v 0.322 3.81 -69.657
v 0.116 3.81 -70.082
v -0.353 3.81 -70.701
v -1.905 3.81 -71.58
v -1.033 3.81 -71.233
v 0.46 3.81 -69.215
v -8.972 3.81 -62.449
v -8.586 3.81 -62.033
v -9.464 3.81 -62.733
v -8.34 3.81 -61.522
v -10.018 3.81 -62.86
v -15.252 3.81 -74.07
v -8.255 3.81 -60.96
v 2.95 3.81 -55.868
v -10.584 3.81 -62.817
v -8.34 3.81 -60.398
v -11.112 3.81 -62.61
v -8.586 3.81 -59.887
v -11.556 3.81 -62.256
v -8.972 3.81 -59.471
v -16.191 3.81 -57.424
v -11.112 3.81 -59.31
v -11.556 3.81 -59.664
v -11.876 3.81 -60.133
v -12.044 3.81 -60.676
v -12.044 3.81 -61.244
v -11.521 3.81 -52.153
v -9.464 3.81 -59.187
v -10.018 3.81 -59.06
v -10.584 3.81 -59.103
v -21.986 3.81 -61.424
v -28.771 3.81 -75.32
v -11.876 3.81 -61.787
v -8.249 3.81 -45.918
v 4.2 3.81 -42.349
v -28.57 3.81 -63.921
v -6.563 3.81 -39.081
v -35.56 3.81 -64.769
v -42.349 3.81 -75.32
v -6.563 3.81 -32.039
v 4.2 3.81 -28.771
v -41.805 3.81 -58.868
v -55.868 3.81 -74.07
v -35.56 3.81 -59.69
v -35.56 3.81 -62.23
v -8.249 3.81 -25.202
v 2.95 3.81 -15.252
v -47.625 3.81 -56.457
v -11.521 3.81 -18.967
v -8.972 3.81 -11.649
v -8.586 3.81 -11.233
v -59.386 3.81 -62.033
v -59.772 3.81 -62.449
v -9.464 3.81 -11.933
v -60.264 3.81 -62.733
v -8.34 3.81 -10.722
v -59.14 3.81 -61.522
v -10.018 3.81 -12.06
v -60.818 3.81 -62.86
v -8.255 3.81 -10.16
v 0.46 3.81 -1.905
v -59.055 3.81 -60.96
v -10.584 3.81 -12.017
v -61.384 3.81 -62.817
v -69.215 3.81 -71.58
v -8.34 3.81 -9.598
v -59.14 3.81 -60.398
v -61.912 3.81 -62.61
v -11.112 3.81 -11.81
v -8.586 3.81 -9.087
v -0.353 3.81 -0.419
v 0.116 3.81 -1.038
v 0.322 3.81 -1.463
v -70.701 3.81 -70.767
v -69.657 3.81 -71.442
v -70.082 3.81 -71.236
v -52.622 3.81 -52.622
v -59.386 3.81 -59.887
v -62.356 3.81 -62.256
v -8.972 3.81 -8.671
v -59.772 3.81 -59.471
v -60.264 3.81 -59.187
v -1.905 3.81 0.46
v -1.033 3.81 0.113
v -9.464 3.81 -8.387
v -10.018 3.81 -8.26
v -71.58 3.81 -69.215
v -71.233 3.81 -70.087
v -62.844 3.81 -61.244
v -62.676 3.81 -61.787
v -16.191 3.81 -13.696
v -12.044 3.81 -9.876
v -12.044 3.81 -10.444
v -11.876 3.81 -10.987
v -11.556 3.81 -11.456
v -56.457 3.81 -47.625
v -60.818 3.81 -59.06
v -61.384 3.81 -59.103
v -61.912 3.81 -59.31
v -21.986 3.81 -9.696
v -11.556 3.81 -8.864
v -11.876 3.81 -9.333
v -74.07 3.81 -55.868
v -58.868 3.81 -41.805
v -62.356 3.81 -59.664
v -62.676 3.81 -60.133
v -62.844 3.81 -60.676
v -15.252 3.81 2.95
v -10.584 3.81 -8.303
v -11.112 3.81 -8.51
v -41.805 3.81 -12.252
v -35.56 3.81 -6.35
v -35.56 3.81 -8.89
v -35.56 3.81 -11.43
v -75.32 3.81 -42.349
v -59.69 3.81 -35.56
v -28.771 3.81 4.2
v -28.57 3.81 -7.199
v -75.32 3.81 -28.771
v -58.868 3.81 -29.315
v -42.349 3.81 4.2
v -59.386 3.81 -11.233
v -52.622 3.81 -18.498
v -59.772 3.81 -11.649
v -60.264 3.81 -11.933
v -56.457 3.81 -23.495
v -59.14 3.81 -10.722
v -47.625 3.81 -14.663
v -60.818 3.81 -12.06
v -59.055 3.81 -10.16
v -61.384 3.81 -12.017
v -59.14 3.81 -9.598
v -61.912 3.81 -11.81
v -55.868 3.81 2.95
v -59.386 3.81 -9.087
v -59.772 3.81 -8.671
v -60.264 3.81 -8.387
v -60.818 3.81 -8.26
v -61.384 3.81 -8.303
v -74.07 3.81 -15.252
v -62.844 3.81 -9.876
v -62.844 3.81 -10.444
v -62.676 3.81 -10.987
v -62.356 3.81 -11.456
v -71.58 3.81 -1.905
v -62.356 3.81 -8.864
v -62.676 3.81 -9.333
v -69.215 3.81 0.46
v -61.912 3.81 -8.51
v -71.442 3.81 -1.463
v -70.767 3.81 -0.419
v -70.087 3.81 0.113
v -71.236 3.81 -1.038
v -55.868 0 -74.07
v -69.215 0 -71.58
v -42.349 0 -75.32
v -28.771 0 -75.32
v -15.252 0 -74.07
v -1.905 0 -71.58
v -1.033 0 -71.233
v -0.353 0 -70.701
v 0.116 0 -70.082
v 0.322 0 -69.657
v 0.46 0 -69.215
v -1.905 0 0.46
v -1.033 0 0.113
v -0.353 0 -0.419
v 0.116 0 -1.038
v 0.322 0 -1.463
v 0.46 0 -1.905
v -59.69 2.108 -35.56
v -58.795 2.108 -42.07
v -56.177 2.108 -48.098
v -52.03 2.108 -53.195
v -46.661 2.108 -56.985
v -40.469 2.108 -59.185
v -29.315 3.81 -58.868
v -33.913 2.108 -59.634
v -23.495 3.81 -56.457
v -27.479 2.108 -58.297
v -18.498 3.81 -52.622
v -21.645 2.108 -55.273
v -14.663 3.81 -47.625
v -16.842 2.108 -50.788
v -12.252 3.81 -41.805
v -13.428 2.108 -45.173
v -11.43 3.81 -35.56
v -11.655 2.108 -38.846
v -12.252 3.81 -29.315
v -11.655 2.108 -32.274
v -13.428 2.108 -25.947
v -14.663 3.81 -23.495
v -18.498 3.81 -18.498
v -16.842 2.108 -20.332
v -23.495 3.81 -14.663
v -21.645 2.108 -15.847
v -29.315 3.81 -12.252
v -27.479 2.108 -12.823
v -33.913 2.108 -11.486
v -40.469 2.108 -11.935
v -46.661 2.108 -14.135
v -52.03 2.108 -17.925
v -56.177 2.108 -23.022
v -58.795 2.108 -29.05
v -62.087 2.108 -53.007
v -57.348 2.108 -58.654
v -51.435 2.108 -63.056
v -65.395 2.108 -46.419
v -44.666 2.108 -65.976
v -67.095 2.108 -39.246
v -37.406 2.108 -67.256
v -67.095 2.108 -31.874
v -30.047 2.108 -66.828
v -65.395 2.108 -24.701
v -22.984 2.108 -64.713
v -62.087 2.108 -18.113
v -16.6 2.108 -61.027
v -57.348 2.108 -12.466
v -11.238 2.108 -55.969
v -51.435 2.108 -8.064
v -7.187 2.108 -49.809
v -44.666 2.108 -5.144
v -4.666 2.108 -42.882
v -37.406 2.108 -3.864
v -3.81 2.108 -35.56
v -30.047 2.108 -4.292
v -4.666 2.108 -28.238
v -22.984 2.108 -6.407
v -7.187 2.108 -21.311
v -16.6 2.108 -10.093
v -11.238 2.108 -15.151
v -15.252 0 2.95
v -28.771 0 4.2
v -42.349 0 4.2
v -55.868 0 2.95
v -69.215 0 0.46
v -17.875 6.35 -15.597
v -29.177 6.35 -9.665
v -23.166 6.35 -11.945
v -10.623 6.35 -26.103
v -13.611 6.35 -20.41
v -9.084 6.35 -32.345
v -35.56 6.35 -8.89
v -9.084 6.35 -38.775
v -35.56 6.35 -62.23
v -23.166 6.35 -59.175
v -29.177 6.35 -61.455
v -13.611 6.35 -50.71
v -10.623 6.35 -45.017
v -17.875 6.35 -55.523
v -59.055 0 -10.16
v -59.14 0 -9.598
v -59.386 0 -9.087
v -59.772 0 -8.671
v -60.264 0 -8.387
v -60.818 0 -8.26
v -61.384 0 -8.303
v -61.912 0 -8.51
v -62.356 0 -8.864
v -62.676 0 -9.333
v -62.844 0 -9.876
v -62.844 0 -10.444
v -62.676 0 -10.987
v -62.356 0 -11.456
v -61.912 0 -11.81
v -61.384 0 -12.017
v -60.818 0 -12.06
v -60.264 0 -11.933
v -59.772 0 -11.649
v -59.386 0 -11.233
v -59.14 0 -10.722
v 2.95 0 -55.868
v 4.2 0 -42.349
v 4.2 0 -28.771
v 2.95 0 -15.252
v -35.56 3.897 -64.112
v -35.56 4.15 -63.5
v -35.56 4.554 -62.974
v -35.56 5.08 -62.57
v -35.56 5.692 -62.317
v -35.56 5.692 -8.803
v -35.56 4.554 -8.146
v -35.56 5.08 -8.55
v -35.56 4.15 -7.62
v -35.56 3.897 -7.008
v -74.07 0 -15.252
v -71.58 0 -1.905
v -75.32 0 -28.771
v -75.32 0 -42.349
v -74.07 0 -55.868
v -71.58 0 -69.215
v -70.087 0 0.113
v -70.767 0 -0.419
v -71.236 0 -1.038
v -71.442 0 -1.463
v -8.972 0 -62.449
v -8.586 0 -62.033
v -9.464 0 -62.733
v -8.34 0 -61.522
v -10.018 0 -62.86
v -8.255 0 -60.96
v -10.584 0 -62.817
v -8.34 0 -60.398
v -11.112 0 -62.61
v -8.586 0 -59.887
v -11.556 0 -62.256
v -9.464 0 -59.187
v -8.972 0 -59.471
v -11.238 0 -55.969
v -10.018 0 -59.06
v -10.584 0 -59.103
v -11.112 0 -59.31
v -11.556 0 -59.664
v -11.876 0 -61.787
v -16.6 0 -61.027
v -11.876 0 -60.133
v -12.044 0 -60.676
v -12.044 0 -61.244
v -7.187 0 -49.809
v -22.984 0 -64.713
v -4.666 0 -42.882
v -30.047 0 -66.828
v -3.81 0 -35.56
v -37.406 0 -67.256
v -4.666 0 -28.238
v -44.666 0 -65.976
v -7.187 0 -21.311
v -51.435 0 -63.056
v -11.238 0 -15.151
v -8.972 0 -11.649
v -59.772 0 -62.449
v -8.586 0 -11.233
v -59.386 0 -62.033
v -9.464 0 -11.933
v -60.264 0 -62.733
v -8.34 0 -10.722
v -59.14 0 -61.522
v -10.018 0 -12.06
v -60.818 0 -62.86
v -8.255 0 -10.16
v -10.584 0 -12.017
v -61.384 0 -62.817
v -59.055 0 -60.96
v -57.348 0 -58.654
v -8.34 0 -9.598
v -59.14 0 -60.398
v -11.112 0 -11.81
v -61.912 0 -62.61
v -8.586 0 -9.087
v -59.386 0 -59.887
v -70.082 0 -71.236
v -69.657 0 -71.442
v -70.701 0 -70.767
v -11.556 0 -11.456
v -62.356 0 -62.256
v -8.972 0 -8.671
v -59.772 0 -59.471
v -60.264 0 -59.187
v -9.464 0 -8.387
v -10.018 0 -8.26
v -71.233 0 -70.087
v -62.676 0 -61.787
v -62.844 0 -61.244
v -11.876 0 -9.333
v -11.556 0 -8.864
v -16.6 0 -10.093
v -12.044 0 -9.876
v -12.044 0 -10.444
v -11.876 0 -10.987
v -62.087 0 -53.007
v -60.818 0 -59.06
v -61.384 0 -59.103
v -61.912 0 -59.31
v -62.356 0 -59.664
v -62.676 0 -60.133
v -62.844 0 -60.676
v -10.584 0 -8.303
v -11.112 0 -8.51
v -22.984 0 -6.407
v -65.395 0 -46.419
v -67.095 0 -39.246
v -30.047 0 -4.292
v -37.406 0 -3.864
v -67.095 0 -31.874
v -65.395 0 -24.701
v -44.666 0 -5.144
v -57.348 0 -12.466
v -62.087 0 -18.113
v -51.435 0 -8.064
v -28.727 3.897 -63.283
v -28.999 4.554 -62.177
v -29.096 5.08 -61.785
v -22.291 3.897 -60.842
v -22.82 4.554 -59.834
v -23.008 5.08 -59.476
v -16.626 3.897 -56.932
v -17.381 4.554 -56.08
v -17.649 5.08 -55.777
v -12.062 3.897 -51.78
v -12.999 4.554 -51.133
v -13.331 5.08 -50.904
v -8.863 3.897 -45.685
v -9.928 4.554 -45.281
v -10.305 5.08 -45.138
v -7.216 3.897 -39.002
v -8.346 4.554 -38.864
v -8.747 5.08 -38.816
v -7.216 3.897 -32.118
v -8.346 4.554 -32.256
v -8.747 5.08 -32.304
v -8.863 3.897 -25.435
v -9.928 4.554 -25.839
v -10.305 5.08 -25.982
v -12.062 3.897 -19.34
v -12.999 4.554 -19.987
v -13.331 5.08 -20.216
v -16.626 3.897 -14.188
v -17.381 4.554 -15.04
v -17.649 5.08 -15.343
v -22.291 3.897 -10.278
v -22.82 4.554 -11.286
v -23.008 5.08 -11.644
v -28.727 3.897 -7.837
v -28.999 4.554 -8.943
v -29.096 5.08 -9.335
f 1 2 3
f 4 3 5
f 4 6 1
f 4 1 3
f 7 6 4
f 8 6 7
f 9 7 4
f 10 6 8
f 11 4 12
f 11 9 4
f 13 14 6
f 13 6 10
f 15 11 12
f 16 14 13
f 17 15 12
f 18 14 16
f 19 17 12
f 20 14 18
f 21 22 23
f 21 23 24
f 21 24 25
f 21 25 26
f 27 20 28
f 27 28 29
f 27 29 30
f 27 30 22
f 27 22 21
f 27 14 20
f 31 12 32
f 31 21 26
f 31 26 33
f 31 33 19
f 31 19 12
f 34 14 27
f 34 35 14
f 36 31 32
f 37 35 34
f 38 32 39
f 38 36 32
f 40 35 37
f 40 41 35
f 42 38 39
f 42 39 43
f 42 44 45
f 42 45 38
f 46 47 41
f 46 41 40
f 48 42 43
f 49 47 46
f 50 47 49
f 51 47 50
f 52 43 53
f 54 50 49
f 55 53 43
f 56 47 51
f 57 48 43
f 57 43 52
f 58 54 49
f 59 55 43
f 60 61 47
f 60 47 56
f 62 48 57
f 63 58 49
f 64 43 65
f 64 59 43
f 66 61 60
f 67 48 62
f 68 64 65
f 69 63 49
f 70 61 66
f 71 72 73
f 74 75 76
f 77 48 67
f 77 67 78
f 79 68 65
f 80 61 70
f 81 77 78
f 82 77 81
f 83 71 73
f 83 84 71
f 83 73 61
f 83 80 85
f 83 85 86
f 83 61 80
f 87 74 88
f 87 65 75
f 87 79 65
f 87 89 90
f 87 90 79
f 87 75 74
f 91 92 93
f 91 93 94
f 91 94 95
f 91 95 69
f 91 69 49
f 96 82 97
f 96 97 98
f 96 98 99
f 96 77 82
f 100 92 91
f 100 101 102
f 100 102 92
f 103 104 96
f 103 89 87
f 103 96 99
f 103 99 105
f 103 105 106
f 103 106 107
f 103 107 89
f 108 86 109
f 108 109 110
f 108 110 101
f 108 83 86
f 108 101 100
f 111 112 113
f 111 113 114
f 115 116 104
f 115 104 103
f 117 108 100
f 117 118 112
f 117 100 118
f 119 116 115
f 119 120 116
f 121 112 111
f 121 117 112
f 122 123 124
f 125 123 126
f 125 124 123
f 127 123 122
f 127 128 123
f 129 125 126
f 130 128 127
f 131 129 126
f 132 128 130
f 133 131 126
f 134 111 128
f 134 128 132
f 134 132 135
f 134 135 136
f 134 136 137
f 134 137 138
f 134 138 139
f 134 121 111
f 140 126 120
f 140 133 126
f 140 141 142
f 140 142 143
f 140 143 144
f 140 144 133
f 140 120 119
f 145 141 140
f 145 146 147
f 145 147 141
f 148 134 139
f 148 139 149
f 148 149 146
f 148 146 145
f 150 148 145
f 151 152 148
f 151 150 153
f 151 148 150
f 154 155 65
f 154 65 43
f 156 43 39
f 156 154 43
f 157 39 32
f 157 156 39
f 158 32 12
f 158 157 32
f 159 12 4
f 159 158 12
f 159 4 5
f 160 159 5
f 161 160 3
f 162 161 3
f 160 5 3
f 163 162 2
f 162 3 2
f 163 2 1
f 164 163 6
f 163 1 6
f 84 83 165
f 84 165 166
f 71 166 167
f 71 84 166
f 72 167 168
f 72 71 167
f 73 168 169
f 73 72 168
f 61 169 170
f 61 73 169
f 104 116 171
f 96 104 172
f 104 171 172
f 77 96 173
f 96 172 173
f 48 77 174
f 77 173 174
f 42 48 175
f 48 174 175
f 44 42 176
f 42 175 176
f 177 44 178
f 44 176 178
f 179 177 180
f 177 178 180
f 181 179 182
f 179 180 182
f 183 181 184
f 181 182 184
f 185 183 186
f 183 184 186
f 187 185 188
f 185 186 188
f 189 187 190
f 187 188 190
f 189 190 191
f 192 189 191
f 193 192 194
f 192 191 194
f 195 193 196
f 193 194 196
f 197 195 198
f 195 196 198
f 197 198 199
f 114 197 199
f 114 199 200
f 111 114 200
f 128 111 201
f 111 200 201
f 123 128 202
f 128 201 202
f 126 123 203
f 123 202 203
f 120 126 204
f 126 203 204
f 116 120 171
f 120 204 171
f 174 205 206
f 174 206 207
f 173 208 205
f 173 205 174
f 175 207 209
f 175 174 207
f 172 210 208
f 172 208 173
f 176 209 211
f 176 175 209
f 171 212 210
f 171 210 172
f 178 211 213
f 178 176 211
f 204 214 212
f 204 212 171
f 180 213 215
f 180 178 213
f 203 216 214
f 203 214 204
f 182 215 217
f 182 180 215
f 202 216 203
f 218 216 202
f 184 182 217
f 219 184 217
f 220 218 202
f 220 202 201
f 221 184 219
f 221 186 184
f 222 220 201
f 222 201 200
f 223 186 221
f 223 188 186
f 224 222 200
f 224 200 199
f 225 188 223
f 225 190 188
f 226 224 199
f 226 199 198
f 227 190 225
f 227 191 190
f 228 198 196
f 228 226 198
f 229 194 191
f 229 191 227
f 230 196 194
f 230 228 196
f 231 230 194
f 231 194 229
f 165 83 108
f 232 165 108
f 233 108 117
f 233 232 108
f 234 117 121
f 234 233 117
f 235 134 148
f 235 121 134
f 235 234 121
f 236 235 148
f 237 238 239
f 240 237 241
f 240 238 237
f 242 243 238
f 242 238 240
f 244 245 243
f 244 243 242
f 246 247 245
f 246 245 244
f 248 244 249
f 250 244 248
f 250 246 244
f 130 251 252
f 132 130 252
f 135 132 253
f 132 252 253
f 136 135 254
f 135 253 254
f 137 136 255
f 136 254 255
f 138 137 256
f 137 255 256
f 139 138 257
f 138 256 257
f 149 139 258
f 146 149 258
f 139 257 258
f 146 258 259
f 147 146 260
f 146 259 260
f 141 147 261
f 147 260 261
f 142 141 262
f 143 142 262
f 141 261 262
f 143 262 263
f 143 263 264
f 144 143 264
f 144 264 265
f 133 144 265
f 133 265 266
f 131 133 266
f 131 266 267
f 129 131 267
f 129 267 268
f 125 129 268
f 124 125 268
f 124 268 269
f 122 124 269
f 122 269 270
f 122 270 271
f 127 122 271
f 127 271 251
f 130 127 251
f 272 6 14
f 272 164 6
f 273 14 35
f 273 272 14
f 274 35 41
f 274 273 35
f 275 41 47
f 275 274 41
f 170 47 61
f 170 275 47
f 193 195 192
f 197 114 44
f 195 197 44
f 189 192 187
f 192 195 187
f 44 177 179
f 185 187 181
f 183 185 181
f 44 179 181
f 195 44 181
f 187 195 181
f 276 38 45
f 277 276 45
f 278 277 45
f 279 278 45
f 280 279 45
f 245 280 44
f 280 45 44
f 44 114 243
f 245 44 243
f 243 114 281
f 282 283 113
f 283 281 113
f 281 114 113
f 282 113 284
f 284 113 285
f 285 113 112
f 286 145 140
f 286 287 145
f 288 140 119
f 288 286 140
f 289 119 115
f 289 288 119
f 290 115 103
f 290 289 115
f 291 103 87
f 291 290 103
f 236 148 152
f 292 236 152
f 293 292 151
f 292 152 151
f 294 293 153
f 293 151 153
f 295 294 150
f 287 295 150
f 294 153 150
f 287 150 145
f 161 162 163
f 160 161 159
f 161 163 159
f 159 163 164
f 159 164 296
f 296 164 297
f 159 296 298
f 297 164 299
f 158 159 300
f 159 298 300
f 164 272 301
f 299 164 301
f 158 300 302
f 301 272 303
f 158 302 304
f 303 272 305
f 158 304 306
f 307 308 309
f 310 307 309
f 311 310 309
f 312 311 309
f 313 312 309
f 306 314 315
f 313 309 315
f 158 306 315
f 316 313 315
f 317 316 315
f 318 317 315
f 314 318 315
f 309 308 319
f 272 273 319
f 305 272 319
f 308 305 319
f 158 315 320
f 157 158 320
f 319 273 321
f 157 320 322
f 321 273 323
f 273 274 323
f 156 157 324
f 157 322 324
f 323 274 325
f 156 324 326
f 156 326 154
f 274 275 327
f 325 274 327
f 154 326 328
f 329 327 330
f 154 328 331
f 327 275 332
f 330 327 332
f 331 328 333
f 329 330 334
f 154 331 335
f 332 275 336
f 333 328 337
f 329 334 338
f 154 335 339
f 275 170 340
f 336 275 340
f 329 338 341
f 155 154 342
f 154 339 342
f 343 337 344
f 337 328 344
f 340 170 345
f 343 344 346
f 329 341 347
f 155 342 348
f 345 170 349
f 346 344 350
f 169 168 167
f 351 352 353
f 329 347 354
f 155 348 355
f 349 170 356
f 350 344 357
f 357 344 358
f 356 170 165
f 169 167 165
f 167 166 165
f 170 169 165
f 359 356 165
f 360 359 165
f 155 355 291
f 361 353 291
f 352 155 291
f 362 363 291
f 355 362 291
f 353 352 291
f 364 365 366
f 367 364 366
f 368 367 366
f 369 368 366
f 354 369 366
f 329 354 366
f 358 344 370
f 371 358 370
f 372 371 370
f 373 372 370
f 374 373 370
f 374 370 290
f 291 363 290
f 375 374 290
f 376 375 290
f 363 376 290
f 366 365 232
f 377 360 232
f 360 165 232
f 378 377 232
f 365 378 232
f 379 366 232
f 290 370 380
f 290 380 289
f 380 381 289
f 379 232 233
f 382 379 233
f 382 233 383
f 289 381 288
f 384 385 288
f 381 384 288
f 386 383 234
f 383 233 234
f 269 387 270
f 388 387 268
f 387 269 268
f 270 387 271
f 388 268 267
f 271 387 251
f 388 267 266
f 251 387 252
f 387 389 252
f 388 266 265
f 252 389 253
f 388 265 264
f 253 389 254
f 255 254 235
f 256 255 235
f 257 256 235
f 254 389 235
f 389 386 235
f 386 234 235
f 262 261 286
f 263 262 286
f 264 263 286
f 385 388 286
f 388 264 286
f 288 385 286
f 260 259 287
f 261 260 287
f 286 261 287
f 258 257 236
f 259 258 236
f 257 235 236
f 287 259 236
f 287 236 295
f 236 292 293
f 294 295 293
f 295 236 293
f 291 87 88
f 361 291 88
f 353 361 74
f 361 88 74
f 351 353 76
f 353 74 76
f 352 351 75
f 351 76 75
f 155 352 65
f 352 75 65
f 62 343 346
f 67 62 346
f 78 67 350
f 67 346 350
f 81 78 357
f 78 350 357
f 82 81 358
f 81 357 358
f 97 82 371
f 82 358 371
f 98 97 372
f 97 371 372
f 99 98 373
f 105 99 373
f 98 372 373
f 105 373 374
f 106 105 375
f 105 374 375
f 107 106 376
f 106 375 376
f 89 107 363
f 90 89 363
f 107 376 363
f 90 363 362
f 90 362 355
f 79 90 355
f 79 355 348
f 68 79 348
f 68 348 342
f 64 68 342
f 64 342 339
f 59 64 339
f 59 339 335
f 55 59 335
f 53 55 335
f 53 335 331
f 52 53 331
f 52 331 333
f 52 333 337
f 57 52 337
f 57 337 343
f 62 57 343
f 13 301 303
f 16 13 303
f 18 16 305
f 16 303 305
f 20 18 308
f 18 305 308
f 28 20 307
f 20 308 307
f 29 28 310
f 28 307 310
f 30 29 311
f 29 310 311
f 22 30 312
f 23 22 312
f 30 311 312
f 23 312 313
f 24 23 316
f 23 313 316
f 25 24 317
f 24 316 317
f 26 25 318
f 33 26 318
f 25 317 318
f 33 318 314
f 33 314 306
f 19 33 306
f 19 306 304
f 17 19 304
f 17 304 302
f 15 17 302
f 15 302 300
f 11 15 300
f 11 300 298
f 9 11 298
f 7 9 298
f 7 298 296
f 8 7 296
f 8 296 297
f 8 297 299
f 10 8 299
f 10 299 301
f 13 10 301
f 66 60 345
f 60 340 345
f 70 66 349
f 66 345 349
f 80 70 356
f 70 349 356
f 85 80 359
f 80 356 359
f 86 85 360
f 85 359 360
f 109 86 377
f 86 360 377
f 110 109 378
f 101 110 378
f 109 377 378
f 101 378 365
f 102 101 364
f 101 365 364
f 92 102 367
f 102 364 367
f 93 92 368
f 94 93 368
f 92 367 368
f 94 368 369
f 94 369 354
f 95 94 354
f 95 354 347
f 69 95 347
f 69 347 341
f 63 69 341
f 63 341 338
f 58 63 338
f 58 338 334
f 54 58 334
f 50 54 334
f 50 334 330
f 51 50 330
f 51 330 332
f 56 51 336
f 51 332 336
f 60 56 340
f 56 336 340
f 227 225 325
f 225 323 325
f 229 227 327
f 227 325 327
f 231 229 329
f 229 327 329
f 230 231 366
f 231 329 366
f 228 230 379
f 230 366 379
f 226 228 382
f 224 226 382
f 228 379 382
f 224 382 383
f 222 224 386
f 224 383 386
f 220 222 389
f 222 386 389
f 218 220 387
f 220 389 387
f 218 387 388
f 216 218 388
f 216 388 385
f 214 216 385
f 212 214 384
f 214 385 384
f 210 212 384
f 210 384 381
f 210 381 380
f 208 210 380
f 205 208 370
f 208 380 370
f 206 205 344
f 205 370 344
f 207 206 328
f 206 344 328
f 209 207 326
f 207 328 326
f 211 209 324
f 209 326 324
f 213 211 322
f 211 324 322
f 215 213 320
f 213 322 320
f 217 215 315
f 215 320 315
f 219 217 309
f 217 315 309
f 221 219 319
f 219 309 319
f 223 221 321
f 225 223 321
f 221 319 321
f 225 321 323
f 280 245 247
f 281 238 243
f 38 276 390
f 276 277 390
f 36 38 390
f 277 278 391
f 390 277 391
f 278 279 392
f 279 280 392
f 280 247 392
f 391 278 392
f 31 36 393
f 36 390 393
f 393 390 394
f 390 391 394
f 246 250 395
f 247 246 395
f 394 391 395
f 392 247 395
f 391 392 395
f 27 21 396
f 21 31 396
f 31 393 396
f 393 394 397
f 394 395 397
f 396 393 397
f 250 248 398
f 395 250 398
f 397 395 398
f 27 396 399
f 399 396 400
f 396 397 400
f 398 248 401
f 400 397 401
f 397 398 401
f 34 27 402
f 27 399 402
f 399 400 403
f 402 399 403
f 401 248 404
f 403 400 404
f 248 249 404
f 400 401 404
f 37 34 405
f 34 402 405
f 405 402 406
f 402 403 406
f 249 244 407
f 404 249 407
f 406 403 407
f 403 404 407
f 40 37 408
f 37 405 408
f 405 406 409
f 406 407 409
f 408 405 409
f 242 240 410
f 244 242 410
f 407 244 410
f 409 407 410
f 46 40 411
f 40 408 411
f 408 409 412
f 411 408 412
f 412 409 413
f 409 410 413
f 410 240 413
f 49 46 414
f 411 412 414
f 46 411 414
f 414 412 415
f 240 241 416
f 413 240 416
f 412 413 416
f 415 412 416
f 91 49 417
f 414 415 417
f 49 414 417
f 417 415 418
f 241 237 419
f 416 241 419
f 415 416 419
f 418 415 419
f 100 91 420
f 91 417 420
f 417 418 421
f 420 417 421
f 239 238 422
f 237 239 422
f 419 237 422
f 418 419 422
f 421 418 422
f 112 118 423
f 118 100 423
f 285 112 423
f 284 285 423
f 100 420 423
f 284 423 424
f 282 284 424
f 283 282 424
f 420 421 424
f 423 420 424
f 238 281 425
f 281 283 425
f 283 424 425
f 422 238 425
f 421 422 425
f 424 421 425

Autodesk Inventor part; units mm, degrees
ref_plane "YZ Plane" through (0, 0, 0) normal (1, 0, 0) x (0, 1, 0)
ref_plane "XZ Plane" through (0, 0, 0) normal (0, 1, 0) x (-1, 0, 0)
ref_plane "XY Plane" through (0, 0, 0) normal (0, 0, 1) x (1, 0, 0)
sketch "Sketch1" plane through (0, 0, 0) normal (0, 1, 0) x (-1, 0, 0)
  line L0 (0, 0) -> (0, -71.12)
  line L1 (0, -71.12) -> (71.12, -71.12)
  line L2 (71.12, -71.12) -> (71.12, 0)
  line L3 (71.12, 0) -> (0, 0)
  arc A0 (71.12, -71.12) -> (71.12, 0) centre (-71.8439, -35.56) ccw
  arc A1 (0, 0) -> (0, -71.12) centre (142.9639, -35.56) ccw
  arc A2 (0, -71.12) -> (71.12, -71.12) centre (35.56, 71.8439) ccw
  arc A3 (71.12, 0) -> (0, 0) centre (35.56, -142.9639) ccw
  circle A4 centre (35.56, -35.56) radius 24.13
  dimension "d9" = 71.12
  dimension "d10" = 71.12
  dimension "d14" = 147.32
  dimension "d17" = 48.26
  dimension "d18" = 35.56
  dimension "d19" = 35.56
extrude "Extrusion1" add sketch "Sketch1" along normal blind 3.81
fillet "Fillet1" radius 3.175 4 edges at (0, 1.905, 0) (0, 1.905, -71.12) (-71.12, 1.905, 0) (-71.12, 1.905, -71.12)
sketch "Sketch2" plane through (0, 3.81, 0) normal (0, 1, 0) x (1, 0, 0)
  point P0 (0, 0)
sketch "Sketch3" plane through (0, 0, 0) normal (0, -1, 0) x (1, 0, 0)
  circle A0 centre (-35.56, -35.56) radius 24.13 projected
  circle A1 centre (-35.56, -35.56) radius 31.75
  circle A2 centre (-35.56, -35.56) radius 24.13
  point P0 (0, 0)
  dimension "d23" = 63.5
extrude "Extrusion2" cut sketch "Sketch3" against normal blind 2.1079
sketch "Sketch4" plane through (0, 0, 0) normal (0, -1, 0) x (1, 0, 0)
  circle A0 centre (-35.56, -35.56) radius 24.13 projected
  circle A1 centre (-35.56, -35.56) radius 31.75 projected
  circle A2 centre (-60.96, -10.16) radius 1.905
  arc A3 (-1.9053, 0.4605) -> (-69.2147, 0.4605) centre (-35.56, -142.9639) ccw construction
  line L0 (-35.56, 4.3561) -> (-35.56, -75.4761) construction
  arc A4 (-69.2147, -71.5805) -> (-1.9053, -71.5805) centre (-35.56, 71.8439) ccw construction
  arc A5 (-71.5805, -1.9053) -> (-71.5805, -69.2147) centre (71.8439, -35.56) ccw construction
  line L1 (-75.4761, -35.56) -> (4.3561, -35.56) construction
  arc A6 (0.4605, -69.2147) -> (0.4605, -1.9053) centre (-142.9639, -35.56) ccw construction
  line L2 (-75.4761, -35.56) -> (-75.4761, 1.4435) construction
  circle A7 centre (-10.16, -10.16) radius 1.905
  line L3 (4.3561, -35.56) -> (4.3561, 1.4435) construction
  circle A8 centre (-60.96, -60.96) radius 1.905
  circle A9 centre (-10.16, -60.96) radius 1.905
  point P0 (0, 0)
  dimension "d26" = 3.81
  dimension "d34" = 25.4
  dimension "d35" = 25.4
  dimension "d36" = 14.5161
  dimension "d37" = 14.5162
  dimension "d38" = 50.8
  dimension "d39" = 50.8
extrude "Extrusion3" cut sketch "Sketch4" against normal blind 25.4 contours A2 | A7 | A8 | A9
sketch "Sketch6" plane through (0, 0, 0) normal (0, -1, 0) x (1, 0, 0)
  point P0 (0, 0)
sketch "Sketch8" plane through (0, 3.81, 0) normal (0, 1, 0) x (1, 0, 0)
  circle A0 centre (-35.56, 35.56) radius 24.13 projected
  circle A1 centre (-35.56, 35.56) radius 24.13 construction
  line L0 (-35.56, 59.69) -> (-35.56, 62.23) construction
  line L1 (-35.56, 11.43) -> (-35.56, 8.89) construction
  line L2 (-11.43, 35.56) -> (-8.89, 35.56) construction
  arc A2 (-35.56, 8.89) -> (-35.56, 62.23) centre (-35.56, 35.56) ccw
  line L3 (-35.56, 62.23) -> (-35.56, 8.89)
  point P0 (0, 0)
  dimension "d44" = 2.54
  dimension "d45" = 2.54
  dimension "d46" = 2.54
extrude "Extrusion5" add sketch "Sketch8" along normal blind 2.54 contours A0 L3 | A0 L3 A2 picked at (-28.7553, 42.0502)
fillet "Fillet2" radius 2.54 1 edges at (-8.89, 3.81, -35.56)
properties part number "_3DPrint"
